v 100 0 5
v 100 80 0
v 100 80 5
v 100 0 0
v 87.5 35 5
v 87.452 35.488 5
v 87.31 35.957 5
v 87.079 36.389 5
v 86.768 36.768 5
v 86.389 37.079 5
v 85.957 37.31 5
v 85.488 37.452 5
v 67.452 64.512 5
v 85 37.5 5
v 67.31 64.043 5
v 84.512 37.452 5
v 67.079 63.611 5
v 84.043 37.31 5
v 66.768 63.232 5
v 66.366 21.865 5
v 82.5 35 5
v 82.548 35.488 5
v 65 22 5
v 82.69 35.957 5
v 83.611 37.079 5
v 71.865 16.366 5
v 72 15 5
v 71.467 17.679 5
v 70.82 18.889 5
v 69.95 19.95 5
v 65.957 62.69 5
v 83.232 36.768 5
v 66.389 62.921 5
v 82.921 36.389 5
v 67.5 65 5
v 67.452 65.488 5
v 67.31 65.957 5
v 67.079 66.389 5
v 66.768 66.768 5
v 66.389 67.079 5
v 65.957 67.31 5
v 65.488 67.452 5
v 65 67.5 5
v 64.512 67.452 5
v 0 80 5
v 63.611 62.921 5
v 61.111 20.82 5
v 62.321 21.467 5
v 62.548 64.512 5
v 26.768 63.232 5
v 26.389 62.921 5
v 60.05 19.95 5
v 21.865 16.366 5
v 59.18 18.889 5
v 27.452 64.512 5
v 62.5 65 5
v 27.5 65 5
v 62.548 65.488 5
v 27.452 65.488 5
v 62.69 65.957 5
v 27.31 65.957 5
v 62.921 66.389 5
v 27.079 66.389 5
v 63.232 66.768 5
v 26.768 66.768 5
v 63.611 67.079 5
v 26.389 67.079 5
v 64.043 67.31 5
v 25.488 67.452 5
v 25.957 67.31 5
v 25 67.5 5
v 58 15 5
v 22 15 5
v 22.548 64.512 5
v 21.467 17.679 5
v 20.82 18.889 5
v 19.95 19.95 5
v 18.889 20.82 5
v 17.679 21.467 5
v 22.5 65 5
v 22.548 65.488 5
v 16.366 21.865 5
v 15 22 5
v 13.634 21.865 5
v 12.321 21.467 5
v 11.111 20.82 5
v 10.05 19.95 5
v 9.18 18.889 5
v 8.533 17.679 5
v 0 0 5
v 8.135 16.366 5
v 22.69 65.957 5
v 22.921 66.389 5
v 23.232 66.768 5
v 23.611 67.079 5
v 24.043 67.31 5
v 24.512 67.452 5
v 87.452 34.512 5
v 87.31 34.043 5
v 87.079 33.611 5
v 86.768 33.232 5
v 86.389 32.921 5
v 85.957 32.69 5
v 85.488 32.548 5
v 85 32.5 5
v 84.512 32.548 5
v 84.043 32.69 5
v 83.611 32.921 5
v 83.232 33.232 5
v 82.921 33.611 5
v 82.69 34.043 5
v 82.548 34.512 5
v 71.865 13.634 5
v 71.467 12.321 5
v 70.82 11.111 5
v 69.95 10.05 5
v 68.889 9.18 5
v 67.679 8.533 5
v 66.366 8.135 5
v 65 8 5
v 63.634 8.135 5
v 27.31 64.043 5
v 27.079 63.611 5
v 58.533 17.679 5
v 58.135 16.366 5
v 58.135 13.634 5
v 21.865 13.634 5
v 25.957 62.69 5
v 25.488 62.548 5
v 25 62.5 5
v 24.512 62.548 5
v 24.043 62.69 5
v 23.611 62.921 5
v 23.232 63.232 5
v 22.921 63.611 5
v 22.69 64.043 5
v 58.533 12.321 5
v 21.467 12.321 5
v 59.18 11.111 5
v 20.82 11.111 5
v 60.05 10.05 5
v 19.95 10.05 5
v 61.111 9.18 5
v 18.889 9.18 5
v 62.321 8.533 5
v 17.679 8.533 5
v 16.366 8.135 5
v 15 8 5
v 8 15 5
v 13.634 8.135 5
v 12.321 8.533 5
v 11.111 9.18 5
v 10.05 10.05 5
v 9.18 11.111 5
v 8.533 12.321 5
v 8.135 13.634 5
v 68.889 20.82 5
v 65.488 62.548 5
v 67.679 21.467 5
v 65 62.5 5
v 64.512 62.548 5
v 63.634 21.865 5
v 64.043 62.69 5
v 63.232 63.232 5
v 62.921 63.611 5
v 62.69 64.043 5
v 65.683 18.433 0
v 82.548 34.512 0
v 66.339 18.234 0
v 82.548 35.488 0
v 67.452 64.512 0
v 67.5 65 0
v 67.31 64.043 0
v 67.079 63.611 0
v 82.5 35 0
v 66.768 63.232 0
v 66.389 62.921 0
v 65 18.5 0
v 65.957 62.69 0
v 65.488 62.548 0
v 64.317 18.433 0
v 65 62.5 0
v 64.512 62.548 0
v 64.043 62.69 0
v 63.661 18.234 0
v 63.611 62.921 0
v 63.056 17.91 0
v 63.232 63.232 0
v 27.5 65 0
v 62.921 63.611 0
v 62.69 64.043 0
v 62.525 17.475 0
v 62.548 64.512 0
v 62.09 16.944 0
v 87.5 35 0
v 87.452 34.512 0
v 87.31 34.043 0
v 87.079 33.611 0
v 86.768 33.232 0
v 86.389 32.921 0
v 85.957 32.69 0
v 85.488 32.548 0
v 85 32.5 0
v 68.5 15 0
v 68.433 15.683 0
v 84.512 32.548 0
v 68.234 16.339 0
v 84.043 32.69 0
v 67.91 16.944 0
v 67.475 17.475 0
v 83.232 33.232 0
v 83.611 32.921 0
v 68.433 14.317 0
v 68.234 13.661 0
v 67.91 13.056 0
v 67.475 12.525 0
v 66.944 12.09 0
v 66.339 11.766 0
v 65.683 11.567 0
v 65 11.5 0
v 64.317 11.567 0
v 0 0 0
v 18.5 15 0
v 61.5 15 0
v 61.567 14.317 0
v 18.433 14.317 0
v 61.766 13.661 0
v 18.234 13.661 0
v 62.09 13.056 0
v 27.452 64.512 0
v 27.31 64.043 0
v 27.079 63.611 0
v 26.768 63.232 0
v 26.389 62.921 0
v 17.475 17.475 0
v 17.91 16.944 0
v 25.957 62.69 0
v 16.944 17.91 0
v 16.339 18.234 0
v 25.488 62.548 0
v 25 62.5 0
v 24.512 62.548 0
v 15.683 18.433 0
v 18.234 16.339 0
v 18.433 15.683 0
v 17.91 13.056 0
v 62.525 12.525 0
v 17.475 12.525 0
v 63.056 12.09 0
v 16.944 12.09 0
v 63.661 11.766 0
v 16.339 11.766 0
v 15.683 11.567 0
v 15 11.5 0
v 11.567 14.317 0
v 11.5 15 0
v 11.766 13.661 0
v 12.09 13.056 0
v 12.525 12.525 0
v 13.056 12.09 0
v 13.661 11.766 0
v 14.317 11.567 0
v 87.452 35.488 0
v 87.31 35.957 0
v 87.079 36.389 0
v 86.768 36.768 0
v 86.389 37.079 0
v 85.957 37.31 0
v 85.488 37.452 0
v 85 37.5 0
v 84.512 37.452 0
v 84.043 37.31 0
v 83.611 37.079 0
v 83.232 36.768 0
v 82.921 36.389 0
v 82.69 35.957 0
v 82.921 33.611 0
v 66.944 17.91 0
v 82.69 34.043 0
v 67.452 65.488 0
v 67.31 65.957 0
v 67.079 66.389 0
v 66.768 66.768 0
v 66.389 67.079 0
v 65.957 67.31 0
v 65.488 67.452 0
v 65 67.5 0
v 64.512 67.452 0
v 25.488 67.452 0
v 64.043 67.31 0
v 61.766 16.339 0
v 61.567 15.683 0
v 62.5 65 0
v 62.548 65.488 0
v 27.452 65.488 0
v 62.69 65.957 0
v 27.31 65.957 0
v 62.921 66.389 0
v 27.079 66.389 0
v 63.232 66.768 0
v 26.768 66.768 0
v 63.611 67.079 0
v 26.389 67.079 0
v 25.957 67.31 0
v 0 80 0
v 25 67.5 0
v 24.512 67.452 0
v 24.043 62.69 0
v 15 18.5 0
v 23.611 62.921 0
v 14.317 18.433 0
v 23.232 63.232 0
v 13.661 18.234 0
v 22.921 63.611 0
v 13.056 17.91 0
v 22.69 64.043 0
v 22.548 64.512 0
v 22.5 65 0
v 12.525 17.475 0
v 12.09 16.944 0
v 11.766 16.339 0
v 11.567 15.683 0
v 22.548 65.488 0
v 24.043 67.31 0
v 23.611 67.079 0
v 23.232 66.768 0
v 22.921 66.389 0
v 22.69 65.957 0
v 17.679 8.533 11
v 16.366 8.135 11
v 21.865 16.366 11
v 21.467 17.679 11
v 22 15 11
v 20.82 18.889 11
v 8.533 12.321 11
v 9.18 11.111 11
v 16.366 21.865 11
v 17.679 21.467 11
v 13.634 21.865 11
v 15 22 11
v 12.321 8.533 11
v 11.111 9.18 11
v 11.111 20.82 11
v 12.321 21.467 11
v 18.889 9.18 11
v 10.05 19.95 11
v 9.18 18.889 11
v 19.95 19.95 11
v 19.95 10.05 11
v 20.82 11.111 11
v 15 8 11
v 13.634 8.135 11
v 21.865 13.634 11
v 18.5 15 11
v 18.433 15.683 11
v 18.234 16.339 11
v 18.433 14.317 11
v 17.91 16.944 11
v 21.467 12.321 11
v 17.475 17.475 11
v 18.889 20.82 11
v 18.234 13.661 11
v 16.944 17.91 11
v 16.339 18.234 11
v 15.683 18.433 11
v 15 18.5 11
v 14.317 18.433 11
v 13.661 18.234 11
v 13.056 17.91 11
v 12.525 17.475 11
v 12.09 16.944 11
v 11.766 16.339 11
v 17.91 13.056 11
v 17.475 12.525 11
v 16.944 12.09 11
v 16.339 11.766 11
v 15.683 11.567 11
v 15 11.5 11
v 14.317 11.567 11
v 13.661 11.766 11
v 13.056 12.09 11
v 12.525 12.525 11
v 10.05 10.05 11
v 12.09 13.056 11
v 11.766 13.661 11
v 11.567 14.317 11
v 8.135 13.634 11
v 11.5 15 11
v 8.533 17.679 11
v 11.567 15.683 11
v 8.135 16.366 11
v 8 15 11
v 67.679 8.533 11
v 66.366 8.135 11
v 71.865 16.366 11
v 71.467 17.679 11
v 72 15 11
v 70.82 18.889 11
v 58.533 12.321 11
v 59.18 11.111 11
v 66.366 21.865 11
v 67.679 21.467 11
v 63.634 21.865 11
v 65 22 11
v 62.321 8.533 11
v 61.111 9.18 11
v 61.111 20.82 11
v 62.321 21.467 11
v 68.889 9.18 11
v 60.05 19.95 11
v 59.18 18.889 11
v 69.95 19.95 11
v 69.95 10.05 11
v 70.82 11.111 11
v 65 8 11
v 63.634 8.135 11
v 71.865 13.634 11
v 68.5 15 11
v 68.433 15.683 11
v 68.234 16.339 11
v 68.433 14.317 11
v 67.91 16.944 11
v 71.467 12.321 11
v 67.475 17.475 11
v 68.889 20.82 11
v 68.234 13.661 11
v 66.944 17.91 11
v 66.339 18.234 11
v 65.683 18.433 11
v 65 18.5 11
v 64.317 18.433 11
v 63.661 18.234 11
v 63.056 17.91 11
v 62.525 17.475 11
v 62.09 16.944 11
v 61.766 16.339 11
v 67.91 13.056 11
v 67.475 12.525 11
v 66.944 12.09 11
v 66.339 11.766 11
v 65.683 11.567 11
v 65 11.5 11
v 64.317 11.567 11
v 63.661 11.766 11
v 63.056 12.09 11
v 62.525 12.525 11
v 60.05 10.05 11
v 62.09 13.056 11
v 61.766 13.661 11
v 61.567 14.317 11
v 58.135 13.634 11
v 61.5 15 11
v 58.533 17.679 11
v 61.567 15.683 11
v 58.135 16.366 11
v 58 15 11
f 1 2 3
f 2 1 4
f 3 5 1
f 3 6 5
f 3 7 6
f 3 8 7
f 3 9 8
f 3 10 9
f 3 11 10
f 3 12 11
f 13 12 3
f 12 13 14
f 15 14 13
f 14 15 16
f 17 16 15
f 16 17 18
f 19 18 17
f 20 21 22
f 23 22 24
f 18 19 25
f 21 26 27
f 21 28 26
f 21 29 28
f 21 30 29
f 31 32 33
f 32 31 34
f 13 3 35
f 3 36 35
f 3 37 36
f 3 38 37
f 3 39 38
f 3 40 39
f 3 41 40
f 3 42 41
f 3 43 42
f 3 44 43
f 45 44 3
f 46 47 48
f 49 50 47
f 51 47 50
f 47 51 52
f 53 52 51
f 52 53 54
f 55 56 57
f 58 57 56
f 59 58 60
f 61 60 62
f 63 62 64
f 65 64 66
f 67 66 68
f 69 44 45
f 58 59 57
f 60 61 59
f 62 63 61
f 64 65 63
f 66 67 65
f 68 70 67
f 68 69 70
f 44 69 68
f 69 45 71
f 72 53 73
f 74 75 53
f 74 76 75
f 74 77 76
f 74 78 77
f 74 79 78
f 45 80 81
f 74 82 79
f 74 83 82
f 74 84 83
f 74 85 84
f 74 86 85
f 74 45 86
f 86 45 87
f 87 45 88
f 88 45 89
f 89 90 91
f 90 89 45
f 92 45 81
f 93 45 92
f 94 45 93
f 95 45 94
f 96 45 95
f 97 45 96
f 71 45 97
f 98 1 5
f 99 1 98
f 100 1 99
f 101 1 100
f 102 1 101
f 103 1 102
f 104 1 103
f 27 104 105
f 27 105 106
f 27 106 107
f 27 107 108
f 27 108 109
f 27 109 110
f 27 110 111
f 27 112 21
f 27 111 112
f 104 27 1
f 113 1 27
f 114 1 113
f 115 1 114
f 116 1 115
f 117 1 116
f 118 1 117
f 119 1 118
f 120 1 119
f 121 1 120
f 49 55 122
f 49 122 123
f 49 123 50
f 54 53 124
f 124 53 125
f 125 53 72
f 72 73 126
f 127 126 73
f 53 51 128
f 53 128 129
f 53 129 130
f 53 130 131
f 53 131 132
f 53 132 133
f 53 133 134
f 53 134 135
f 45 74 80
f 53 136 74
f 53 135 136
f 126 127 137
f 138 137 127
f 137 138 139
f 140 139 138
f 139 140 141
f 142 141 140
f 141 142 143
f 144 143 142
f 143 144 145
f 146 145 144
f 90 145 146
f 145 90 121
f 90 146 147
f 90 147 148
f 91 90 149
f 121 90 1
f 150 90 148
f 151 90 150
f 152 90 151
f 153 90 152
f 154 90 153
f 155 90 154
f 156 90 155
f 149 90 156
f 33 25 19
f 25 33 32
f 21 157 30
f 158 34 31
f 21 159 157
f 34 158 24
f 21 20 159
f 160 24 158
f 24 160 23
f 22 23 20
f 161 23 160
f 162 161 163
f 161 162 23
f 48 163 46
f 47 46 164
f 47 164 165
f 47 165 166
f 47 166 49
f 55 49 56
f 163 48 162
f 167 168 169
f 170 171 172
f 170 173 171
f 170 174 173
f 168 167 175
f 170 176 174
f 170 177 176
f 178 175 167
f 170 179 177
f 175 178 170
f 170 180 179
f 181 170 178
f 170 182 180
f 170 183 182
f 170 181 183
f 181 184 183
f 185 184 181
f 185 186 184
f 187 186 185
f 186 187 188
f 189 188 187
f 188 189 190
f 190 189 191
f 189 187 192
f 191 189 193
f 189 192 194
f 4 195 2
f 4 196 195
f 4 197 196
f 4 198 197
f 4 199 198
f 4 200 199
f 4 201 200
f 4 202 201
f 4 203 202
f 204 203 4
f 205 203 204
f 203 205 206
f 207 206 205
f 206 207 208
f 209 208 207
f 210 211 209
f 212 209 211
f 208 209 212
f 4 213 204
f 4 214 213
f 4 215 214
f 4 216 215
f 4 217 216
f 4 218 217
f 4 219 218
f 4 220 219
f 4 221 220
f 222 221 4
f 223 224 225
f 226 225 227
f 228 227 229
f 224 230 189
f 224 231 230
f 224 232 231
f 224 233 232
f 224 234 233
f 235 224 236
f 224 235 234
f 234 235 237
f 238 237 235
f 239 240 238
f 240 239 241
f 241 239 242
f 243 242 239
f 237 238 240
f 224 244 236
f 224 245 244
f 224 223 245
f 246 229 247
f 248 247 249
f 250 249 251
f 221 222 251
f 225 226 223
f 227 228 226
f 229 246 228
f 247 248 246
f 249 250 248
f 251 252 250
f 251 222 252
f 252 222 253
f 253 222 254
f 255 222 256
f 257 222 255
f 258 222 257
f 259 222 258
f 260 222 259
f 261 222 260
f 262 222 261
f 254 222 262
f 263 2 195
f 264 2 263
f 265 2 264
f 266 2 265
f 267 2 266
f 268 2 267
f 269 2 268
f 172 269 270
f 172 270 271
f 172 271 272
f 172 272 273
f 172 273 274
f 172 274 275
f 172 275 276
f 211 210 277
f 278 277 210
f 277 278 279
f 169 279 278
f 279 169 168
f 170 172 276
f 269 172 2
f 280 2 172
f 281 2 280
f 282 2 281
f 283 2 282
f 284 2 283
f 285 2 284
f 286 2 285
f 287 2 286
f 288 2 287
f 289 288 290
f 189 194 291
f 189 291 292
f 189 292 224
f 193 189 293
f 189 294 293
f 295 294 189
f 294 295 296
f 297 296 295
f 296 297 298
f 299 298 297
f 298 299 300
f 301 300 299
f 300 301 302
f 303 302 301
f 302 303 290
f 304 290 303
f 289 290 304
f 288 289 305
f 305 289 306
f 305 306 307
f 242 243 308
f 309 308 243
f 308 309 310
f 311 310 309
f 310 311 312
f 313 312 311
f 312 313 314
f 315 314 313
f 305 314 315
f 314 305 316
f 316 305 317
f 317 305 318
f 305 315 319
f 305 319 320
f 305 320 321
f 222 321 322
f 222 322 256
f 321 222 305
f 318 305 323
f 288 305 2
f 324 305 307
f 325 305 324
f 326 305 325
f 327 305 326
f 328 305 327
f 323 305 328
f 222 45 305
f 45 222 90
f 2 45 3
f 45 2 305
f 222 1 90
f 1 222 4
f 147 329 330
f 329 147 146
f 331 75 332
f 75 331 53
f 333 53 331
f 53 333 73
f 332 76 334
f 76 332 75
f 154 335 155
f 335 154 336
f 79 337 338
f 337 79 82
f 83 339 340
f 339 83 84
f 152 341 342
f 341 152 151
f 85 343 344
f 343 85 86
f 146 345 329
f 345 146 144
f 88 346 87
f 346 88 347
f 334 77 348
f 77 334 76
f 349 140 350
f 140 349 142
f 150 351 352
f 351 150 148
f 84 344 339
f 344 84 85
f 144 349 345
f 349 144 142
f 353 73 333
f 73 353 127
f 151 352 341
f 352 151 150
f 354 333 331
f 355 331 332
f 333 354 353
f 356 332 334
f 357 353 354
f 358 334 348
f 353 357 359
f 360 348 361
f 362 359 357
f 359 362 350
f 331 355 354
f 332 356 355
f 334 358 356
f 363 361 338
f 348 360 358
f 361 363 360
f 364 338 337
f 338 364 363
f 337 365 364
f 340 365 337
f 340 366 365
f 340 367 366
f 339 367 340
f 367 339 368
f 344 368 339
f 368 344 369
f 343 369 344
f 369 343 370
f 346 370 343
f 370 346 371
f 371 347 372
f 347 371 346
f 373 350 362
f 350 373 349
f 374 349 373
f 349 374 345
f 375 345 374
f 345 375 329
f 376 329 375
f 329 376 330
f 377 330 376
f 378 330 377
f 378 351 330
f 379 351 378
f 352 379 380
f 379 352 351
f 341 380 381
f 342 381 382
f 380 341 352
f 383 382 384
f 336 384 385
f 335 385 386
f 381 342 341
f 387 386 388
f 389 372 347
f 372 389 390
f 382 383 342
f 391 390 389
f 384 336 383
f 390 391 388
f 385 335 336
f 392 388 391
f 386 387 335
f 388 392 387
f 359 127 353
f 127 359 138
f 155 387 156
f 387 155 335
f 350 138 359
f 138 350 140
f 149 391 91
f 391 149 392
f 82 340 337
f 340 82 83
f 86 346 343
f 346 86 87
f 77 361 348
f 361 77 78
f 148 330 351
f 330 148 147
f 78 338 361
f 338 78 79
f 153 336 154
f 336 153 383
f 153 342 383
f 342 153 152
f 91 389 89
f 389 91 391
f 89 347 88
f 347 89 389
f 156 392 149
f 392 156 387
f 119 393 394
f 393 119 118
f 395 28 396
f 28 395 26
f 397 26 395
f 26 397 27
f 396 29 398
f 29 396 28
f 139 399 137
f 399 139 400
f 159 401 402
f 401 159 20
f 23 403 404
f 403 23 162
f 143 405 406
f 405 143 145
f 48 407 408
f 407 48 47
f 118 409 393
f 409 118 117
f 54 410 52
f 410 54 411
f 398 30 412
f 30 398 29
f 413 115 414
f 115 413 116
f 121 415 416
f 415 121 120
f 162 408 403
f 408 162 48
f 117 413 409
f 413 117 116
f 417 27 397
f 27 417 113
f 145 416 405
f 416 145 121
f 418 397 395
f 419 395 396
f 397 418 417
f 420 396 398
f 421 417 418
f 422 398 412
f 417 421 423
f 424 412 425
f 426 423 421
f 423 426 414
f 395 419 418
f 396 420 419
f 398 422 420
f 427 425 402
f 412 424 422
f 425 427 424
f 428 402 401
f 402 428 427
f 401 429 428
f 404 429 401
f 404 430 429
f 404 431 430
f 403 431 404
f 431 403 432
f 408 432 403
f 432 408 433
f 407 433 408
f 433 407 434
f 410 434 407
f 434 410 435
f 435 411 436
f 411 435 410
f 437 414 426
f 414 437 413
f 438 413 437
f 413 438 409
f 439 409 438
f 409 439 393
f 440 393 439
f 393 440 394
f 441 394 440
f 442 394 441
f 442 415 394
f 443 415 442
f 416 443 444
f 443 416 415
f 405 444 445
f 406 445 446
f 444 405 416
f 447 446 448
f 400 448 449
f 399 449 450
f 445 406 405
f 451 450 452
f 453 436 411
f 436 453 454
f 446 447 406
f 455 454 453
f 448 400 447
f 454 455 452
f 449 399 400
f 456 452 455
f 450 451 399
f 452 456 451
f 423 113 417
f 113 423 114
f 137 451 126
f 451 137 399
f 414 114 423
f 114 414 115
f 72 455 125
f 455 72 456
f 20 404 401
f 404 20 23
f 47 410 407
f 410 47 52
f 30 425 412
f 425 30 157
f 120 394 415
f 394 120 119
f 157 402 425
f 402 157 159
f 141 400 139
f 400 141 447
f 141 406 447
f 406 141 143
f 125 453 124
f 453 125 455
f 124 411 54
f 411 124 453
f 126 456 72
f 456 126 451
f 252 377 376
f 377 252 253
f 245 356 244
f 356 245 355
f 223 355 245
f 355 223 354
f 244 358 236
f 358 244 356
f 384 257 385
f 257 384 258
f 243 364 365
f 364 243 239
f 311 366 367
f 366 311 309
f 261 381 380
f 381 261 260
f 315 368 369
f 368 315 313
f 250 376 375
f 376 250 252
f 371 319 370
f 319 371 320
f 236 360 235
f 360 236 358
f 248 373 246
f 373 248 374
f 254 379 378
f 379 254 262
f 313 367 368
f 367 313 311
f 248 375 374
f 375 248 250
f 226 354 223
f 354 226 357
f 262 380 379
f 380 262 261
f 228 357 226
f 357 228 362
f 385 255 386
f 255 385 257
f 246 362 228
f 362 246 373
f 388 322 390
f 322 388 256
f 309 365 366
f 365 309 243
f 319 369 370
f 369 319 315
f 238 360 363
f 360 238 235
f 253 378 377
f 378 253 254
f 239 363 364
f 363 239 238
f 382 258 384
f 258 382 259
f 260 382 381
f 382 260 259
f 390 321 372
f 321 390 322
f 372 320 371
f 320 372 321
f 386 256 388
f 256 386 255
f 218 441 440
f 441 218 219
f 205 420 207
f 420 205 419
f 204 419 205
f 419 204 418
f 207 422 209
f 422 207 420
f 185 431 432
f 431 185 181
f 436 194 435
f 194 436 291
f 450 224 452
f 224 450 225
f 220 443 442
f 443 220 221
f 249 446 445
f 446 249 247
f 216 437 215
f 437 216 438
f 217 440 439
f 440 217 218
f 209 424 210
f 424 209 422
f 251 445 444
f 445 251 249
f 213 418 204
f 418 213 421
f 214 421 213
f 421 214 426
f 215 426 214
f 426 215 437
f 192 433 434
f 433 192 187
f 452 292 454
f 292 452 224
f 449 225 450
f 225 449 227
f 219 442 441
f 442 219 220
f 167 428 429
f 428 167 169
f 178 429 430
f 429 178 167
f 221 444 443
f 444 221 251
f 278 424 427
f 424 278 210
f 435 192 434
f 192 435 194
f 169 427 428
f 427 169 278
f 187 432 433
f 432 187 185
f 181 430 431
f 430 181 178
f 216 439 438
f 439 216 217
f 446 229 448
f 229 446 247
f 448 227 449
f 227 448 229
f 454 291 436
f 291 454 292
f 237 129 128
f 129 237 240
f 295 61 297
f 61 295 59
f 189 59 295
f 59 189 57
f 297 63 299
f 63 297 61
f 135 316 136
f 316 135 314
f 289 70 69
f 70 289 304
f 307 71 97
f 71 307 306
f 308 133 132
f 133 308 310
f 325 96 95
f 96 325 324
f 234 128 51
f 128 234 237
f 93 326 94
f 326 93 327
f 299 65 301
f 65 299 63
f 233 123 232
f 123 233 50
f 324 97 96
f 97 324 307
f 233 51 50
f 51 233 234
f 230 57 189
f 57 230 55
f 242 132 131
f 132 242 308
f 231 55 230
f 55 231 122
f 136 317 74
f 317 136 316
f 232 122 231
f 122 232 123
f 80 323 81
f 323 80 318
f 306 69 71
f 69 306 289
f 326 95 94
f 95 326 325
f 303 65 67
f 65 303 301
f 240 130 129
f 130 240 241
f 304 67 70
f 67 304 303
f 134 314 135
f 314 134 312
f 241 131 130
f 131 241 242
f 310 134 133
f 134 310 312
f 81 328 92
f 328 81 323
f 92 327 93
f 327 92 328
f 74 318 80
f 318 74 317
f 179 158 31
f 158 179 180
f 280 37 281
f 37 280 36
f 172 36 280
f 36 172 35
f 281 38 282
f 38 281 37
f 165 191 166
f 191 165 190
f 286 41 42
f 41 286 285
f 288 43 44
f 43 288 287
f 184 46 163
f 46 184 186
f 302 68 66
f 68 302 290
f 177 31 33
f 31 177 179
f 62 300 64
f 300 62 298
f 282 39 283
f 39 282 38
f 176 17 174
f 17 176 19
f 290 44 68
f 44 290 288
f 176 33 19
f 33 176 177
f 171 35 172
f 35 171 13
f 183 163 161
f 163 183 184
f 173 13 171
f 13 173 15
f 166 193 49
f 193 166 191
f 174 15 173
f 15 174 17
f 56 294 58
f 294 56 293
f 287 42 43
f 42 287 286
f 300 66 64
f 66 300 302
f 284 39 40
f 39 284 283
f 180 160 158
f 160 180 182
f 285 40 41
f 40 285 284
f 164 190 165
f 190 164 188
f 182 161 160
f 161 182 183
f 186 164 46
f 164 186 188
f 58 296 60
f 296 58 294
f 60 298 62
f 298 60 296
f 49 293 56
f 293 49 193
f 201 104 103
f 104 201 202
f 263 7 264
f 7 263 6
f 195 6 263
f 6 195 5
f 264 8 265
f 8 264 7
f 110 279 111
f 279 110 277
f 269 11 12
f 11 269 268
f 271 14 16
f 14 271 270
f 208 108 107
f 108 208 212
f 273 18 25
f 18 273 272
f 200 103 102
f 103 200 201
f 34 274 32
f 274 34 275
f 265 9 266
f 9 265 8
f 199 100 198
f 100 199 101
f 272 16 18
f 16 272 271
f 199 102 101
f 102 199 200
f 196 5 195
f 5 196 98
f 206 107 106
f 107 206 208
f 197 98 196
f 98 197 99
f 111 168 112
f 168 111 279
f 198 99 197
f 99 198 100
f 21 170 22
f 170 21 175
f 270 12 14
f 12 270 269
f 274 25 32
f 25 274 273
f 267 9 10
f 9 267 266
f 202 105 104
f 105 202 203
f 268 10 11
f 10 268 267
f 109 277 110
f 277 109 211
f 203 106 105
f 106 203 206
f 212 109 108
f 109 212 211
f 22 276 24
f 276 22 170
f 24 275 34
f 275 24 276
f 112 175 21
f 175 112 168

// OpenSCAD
$fn = 32;

// ----------------------------------------------------------------------
// Mixed field: bosses and holes at given coordinates
// ----------------------------------------------------------------------

// --- parameters (mm) ---
plate_l = 100;            // plate length, X
plate_w = 80;             // plate width, Y
plate_t = 5;              // plate thickness, Z
boss_d = 14;              // boss diameter
boss_h = 6;               // boss height above the plate
hole_d = 5;               // through hole diameter

total_h = plate_t + boss_h;  // overall height

difference() {
  union() {
    cube([plate_l, plate_w, plate_t]);
    translate([15, 15, plate_t]) cylinder(h = boss_h, d = boss_d);
    translate([65, 15, plate_t]) cylinder(h = boss_h, d = boss_d);
  }
  translate([15, 15, -1]) cylinder(h = total_h + 2, d = boss_d / 2);
  translate([65, 15, -1]) cylinder(h = total_h + 2, d = boss_d / 2);
  translate([25, 65, -1]) cylinder(h = plate_t + 2, d = hole_d);
  translate([65, 65, -1]) cylinder(h = plate_t + 2, d = hole_d);
  translate([85, 35, -1]) cylinder(h = plate_t + 2, d = hole_d);
}
